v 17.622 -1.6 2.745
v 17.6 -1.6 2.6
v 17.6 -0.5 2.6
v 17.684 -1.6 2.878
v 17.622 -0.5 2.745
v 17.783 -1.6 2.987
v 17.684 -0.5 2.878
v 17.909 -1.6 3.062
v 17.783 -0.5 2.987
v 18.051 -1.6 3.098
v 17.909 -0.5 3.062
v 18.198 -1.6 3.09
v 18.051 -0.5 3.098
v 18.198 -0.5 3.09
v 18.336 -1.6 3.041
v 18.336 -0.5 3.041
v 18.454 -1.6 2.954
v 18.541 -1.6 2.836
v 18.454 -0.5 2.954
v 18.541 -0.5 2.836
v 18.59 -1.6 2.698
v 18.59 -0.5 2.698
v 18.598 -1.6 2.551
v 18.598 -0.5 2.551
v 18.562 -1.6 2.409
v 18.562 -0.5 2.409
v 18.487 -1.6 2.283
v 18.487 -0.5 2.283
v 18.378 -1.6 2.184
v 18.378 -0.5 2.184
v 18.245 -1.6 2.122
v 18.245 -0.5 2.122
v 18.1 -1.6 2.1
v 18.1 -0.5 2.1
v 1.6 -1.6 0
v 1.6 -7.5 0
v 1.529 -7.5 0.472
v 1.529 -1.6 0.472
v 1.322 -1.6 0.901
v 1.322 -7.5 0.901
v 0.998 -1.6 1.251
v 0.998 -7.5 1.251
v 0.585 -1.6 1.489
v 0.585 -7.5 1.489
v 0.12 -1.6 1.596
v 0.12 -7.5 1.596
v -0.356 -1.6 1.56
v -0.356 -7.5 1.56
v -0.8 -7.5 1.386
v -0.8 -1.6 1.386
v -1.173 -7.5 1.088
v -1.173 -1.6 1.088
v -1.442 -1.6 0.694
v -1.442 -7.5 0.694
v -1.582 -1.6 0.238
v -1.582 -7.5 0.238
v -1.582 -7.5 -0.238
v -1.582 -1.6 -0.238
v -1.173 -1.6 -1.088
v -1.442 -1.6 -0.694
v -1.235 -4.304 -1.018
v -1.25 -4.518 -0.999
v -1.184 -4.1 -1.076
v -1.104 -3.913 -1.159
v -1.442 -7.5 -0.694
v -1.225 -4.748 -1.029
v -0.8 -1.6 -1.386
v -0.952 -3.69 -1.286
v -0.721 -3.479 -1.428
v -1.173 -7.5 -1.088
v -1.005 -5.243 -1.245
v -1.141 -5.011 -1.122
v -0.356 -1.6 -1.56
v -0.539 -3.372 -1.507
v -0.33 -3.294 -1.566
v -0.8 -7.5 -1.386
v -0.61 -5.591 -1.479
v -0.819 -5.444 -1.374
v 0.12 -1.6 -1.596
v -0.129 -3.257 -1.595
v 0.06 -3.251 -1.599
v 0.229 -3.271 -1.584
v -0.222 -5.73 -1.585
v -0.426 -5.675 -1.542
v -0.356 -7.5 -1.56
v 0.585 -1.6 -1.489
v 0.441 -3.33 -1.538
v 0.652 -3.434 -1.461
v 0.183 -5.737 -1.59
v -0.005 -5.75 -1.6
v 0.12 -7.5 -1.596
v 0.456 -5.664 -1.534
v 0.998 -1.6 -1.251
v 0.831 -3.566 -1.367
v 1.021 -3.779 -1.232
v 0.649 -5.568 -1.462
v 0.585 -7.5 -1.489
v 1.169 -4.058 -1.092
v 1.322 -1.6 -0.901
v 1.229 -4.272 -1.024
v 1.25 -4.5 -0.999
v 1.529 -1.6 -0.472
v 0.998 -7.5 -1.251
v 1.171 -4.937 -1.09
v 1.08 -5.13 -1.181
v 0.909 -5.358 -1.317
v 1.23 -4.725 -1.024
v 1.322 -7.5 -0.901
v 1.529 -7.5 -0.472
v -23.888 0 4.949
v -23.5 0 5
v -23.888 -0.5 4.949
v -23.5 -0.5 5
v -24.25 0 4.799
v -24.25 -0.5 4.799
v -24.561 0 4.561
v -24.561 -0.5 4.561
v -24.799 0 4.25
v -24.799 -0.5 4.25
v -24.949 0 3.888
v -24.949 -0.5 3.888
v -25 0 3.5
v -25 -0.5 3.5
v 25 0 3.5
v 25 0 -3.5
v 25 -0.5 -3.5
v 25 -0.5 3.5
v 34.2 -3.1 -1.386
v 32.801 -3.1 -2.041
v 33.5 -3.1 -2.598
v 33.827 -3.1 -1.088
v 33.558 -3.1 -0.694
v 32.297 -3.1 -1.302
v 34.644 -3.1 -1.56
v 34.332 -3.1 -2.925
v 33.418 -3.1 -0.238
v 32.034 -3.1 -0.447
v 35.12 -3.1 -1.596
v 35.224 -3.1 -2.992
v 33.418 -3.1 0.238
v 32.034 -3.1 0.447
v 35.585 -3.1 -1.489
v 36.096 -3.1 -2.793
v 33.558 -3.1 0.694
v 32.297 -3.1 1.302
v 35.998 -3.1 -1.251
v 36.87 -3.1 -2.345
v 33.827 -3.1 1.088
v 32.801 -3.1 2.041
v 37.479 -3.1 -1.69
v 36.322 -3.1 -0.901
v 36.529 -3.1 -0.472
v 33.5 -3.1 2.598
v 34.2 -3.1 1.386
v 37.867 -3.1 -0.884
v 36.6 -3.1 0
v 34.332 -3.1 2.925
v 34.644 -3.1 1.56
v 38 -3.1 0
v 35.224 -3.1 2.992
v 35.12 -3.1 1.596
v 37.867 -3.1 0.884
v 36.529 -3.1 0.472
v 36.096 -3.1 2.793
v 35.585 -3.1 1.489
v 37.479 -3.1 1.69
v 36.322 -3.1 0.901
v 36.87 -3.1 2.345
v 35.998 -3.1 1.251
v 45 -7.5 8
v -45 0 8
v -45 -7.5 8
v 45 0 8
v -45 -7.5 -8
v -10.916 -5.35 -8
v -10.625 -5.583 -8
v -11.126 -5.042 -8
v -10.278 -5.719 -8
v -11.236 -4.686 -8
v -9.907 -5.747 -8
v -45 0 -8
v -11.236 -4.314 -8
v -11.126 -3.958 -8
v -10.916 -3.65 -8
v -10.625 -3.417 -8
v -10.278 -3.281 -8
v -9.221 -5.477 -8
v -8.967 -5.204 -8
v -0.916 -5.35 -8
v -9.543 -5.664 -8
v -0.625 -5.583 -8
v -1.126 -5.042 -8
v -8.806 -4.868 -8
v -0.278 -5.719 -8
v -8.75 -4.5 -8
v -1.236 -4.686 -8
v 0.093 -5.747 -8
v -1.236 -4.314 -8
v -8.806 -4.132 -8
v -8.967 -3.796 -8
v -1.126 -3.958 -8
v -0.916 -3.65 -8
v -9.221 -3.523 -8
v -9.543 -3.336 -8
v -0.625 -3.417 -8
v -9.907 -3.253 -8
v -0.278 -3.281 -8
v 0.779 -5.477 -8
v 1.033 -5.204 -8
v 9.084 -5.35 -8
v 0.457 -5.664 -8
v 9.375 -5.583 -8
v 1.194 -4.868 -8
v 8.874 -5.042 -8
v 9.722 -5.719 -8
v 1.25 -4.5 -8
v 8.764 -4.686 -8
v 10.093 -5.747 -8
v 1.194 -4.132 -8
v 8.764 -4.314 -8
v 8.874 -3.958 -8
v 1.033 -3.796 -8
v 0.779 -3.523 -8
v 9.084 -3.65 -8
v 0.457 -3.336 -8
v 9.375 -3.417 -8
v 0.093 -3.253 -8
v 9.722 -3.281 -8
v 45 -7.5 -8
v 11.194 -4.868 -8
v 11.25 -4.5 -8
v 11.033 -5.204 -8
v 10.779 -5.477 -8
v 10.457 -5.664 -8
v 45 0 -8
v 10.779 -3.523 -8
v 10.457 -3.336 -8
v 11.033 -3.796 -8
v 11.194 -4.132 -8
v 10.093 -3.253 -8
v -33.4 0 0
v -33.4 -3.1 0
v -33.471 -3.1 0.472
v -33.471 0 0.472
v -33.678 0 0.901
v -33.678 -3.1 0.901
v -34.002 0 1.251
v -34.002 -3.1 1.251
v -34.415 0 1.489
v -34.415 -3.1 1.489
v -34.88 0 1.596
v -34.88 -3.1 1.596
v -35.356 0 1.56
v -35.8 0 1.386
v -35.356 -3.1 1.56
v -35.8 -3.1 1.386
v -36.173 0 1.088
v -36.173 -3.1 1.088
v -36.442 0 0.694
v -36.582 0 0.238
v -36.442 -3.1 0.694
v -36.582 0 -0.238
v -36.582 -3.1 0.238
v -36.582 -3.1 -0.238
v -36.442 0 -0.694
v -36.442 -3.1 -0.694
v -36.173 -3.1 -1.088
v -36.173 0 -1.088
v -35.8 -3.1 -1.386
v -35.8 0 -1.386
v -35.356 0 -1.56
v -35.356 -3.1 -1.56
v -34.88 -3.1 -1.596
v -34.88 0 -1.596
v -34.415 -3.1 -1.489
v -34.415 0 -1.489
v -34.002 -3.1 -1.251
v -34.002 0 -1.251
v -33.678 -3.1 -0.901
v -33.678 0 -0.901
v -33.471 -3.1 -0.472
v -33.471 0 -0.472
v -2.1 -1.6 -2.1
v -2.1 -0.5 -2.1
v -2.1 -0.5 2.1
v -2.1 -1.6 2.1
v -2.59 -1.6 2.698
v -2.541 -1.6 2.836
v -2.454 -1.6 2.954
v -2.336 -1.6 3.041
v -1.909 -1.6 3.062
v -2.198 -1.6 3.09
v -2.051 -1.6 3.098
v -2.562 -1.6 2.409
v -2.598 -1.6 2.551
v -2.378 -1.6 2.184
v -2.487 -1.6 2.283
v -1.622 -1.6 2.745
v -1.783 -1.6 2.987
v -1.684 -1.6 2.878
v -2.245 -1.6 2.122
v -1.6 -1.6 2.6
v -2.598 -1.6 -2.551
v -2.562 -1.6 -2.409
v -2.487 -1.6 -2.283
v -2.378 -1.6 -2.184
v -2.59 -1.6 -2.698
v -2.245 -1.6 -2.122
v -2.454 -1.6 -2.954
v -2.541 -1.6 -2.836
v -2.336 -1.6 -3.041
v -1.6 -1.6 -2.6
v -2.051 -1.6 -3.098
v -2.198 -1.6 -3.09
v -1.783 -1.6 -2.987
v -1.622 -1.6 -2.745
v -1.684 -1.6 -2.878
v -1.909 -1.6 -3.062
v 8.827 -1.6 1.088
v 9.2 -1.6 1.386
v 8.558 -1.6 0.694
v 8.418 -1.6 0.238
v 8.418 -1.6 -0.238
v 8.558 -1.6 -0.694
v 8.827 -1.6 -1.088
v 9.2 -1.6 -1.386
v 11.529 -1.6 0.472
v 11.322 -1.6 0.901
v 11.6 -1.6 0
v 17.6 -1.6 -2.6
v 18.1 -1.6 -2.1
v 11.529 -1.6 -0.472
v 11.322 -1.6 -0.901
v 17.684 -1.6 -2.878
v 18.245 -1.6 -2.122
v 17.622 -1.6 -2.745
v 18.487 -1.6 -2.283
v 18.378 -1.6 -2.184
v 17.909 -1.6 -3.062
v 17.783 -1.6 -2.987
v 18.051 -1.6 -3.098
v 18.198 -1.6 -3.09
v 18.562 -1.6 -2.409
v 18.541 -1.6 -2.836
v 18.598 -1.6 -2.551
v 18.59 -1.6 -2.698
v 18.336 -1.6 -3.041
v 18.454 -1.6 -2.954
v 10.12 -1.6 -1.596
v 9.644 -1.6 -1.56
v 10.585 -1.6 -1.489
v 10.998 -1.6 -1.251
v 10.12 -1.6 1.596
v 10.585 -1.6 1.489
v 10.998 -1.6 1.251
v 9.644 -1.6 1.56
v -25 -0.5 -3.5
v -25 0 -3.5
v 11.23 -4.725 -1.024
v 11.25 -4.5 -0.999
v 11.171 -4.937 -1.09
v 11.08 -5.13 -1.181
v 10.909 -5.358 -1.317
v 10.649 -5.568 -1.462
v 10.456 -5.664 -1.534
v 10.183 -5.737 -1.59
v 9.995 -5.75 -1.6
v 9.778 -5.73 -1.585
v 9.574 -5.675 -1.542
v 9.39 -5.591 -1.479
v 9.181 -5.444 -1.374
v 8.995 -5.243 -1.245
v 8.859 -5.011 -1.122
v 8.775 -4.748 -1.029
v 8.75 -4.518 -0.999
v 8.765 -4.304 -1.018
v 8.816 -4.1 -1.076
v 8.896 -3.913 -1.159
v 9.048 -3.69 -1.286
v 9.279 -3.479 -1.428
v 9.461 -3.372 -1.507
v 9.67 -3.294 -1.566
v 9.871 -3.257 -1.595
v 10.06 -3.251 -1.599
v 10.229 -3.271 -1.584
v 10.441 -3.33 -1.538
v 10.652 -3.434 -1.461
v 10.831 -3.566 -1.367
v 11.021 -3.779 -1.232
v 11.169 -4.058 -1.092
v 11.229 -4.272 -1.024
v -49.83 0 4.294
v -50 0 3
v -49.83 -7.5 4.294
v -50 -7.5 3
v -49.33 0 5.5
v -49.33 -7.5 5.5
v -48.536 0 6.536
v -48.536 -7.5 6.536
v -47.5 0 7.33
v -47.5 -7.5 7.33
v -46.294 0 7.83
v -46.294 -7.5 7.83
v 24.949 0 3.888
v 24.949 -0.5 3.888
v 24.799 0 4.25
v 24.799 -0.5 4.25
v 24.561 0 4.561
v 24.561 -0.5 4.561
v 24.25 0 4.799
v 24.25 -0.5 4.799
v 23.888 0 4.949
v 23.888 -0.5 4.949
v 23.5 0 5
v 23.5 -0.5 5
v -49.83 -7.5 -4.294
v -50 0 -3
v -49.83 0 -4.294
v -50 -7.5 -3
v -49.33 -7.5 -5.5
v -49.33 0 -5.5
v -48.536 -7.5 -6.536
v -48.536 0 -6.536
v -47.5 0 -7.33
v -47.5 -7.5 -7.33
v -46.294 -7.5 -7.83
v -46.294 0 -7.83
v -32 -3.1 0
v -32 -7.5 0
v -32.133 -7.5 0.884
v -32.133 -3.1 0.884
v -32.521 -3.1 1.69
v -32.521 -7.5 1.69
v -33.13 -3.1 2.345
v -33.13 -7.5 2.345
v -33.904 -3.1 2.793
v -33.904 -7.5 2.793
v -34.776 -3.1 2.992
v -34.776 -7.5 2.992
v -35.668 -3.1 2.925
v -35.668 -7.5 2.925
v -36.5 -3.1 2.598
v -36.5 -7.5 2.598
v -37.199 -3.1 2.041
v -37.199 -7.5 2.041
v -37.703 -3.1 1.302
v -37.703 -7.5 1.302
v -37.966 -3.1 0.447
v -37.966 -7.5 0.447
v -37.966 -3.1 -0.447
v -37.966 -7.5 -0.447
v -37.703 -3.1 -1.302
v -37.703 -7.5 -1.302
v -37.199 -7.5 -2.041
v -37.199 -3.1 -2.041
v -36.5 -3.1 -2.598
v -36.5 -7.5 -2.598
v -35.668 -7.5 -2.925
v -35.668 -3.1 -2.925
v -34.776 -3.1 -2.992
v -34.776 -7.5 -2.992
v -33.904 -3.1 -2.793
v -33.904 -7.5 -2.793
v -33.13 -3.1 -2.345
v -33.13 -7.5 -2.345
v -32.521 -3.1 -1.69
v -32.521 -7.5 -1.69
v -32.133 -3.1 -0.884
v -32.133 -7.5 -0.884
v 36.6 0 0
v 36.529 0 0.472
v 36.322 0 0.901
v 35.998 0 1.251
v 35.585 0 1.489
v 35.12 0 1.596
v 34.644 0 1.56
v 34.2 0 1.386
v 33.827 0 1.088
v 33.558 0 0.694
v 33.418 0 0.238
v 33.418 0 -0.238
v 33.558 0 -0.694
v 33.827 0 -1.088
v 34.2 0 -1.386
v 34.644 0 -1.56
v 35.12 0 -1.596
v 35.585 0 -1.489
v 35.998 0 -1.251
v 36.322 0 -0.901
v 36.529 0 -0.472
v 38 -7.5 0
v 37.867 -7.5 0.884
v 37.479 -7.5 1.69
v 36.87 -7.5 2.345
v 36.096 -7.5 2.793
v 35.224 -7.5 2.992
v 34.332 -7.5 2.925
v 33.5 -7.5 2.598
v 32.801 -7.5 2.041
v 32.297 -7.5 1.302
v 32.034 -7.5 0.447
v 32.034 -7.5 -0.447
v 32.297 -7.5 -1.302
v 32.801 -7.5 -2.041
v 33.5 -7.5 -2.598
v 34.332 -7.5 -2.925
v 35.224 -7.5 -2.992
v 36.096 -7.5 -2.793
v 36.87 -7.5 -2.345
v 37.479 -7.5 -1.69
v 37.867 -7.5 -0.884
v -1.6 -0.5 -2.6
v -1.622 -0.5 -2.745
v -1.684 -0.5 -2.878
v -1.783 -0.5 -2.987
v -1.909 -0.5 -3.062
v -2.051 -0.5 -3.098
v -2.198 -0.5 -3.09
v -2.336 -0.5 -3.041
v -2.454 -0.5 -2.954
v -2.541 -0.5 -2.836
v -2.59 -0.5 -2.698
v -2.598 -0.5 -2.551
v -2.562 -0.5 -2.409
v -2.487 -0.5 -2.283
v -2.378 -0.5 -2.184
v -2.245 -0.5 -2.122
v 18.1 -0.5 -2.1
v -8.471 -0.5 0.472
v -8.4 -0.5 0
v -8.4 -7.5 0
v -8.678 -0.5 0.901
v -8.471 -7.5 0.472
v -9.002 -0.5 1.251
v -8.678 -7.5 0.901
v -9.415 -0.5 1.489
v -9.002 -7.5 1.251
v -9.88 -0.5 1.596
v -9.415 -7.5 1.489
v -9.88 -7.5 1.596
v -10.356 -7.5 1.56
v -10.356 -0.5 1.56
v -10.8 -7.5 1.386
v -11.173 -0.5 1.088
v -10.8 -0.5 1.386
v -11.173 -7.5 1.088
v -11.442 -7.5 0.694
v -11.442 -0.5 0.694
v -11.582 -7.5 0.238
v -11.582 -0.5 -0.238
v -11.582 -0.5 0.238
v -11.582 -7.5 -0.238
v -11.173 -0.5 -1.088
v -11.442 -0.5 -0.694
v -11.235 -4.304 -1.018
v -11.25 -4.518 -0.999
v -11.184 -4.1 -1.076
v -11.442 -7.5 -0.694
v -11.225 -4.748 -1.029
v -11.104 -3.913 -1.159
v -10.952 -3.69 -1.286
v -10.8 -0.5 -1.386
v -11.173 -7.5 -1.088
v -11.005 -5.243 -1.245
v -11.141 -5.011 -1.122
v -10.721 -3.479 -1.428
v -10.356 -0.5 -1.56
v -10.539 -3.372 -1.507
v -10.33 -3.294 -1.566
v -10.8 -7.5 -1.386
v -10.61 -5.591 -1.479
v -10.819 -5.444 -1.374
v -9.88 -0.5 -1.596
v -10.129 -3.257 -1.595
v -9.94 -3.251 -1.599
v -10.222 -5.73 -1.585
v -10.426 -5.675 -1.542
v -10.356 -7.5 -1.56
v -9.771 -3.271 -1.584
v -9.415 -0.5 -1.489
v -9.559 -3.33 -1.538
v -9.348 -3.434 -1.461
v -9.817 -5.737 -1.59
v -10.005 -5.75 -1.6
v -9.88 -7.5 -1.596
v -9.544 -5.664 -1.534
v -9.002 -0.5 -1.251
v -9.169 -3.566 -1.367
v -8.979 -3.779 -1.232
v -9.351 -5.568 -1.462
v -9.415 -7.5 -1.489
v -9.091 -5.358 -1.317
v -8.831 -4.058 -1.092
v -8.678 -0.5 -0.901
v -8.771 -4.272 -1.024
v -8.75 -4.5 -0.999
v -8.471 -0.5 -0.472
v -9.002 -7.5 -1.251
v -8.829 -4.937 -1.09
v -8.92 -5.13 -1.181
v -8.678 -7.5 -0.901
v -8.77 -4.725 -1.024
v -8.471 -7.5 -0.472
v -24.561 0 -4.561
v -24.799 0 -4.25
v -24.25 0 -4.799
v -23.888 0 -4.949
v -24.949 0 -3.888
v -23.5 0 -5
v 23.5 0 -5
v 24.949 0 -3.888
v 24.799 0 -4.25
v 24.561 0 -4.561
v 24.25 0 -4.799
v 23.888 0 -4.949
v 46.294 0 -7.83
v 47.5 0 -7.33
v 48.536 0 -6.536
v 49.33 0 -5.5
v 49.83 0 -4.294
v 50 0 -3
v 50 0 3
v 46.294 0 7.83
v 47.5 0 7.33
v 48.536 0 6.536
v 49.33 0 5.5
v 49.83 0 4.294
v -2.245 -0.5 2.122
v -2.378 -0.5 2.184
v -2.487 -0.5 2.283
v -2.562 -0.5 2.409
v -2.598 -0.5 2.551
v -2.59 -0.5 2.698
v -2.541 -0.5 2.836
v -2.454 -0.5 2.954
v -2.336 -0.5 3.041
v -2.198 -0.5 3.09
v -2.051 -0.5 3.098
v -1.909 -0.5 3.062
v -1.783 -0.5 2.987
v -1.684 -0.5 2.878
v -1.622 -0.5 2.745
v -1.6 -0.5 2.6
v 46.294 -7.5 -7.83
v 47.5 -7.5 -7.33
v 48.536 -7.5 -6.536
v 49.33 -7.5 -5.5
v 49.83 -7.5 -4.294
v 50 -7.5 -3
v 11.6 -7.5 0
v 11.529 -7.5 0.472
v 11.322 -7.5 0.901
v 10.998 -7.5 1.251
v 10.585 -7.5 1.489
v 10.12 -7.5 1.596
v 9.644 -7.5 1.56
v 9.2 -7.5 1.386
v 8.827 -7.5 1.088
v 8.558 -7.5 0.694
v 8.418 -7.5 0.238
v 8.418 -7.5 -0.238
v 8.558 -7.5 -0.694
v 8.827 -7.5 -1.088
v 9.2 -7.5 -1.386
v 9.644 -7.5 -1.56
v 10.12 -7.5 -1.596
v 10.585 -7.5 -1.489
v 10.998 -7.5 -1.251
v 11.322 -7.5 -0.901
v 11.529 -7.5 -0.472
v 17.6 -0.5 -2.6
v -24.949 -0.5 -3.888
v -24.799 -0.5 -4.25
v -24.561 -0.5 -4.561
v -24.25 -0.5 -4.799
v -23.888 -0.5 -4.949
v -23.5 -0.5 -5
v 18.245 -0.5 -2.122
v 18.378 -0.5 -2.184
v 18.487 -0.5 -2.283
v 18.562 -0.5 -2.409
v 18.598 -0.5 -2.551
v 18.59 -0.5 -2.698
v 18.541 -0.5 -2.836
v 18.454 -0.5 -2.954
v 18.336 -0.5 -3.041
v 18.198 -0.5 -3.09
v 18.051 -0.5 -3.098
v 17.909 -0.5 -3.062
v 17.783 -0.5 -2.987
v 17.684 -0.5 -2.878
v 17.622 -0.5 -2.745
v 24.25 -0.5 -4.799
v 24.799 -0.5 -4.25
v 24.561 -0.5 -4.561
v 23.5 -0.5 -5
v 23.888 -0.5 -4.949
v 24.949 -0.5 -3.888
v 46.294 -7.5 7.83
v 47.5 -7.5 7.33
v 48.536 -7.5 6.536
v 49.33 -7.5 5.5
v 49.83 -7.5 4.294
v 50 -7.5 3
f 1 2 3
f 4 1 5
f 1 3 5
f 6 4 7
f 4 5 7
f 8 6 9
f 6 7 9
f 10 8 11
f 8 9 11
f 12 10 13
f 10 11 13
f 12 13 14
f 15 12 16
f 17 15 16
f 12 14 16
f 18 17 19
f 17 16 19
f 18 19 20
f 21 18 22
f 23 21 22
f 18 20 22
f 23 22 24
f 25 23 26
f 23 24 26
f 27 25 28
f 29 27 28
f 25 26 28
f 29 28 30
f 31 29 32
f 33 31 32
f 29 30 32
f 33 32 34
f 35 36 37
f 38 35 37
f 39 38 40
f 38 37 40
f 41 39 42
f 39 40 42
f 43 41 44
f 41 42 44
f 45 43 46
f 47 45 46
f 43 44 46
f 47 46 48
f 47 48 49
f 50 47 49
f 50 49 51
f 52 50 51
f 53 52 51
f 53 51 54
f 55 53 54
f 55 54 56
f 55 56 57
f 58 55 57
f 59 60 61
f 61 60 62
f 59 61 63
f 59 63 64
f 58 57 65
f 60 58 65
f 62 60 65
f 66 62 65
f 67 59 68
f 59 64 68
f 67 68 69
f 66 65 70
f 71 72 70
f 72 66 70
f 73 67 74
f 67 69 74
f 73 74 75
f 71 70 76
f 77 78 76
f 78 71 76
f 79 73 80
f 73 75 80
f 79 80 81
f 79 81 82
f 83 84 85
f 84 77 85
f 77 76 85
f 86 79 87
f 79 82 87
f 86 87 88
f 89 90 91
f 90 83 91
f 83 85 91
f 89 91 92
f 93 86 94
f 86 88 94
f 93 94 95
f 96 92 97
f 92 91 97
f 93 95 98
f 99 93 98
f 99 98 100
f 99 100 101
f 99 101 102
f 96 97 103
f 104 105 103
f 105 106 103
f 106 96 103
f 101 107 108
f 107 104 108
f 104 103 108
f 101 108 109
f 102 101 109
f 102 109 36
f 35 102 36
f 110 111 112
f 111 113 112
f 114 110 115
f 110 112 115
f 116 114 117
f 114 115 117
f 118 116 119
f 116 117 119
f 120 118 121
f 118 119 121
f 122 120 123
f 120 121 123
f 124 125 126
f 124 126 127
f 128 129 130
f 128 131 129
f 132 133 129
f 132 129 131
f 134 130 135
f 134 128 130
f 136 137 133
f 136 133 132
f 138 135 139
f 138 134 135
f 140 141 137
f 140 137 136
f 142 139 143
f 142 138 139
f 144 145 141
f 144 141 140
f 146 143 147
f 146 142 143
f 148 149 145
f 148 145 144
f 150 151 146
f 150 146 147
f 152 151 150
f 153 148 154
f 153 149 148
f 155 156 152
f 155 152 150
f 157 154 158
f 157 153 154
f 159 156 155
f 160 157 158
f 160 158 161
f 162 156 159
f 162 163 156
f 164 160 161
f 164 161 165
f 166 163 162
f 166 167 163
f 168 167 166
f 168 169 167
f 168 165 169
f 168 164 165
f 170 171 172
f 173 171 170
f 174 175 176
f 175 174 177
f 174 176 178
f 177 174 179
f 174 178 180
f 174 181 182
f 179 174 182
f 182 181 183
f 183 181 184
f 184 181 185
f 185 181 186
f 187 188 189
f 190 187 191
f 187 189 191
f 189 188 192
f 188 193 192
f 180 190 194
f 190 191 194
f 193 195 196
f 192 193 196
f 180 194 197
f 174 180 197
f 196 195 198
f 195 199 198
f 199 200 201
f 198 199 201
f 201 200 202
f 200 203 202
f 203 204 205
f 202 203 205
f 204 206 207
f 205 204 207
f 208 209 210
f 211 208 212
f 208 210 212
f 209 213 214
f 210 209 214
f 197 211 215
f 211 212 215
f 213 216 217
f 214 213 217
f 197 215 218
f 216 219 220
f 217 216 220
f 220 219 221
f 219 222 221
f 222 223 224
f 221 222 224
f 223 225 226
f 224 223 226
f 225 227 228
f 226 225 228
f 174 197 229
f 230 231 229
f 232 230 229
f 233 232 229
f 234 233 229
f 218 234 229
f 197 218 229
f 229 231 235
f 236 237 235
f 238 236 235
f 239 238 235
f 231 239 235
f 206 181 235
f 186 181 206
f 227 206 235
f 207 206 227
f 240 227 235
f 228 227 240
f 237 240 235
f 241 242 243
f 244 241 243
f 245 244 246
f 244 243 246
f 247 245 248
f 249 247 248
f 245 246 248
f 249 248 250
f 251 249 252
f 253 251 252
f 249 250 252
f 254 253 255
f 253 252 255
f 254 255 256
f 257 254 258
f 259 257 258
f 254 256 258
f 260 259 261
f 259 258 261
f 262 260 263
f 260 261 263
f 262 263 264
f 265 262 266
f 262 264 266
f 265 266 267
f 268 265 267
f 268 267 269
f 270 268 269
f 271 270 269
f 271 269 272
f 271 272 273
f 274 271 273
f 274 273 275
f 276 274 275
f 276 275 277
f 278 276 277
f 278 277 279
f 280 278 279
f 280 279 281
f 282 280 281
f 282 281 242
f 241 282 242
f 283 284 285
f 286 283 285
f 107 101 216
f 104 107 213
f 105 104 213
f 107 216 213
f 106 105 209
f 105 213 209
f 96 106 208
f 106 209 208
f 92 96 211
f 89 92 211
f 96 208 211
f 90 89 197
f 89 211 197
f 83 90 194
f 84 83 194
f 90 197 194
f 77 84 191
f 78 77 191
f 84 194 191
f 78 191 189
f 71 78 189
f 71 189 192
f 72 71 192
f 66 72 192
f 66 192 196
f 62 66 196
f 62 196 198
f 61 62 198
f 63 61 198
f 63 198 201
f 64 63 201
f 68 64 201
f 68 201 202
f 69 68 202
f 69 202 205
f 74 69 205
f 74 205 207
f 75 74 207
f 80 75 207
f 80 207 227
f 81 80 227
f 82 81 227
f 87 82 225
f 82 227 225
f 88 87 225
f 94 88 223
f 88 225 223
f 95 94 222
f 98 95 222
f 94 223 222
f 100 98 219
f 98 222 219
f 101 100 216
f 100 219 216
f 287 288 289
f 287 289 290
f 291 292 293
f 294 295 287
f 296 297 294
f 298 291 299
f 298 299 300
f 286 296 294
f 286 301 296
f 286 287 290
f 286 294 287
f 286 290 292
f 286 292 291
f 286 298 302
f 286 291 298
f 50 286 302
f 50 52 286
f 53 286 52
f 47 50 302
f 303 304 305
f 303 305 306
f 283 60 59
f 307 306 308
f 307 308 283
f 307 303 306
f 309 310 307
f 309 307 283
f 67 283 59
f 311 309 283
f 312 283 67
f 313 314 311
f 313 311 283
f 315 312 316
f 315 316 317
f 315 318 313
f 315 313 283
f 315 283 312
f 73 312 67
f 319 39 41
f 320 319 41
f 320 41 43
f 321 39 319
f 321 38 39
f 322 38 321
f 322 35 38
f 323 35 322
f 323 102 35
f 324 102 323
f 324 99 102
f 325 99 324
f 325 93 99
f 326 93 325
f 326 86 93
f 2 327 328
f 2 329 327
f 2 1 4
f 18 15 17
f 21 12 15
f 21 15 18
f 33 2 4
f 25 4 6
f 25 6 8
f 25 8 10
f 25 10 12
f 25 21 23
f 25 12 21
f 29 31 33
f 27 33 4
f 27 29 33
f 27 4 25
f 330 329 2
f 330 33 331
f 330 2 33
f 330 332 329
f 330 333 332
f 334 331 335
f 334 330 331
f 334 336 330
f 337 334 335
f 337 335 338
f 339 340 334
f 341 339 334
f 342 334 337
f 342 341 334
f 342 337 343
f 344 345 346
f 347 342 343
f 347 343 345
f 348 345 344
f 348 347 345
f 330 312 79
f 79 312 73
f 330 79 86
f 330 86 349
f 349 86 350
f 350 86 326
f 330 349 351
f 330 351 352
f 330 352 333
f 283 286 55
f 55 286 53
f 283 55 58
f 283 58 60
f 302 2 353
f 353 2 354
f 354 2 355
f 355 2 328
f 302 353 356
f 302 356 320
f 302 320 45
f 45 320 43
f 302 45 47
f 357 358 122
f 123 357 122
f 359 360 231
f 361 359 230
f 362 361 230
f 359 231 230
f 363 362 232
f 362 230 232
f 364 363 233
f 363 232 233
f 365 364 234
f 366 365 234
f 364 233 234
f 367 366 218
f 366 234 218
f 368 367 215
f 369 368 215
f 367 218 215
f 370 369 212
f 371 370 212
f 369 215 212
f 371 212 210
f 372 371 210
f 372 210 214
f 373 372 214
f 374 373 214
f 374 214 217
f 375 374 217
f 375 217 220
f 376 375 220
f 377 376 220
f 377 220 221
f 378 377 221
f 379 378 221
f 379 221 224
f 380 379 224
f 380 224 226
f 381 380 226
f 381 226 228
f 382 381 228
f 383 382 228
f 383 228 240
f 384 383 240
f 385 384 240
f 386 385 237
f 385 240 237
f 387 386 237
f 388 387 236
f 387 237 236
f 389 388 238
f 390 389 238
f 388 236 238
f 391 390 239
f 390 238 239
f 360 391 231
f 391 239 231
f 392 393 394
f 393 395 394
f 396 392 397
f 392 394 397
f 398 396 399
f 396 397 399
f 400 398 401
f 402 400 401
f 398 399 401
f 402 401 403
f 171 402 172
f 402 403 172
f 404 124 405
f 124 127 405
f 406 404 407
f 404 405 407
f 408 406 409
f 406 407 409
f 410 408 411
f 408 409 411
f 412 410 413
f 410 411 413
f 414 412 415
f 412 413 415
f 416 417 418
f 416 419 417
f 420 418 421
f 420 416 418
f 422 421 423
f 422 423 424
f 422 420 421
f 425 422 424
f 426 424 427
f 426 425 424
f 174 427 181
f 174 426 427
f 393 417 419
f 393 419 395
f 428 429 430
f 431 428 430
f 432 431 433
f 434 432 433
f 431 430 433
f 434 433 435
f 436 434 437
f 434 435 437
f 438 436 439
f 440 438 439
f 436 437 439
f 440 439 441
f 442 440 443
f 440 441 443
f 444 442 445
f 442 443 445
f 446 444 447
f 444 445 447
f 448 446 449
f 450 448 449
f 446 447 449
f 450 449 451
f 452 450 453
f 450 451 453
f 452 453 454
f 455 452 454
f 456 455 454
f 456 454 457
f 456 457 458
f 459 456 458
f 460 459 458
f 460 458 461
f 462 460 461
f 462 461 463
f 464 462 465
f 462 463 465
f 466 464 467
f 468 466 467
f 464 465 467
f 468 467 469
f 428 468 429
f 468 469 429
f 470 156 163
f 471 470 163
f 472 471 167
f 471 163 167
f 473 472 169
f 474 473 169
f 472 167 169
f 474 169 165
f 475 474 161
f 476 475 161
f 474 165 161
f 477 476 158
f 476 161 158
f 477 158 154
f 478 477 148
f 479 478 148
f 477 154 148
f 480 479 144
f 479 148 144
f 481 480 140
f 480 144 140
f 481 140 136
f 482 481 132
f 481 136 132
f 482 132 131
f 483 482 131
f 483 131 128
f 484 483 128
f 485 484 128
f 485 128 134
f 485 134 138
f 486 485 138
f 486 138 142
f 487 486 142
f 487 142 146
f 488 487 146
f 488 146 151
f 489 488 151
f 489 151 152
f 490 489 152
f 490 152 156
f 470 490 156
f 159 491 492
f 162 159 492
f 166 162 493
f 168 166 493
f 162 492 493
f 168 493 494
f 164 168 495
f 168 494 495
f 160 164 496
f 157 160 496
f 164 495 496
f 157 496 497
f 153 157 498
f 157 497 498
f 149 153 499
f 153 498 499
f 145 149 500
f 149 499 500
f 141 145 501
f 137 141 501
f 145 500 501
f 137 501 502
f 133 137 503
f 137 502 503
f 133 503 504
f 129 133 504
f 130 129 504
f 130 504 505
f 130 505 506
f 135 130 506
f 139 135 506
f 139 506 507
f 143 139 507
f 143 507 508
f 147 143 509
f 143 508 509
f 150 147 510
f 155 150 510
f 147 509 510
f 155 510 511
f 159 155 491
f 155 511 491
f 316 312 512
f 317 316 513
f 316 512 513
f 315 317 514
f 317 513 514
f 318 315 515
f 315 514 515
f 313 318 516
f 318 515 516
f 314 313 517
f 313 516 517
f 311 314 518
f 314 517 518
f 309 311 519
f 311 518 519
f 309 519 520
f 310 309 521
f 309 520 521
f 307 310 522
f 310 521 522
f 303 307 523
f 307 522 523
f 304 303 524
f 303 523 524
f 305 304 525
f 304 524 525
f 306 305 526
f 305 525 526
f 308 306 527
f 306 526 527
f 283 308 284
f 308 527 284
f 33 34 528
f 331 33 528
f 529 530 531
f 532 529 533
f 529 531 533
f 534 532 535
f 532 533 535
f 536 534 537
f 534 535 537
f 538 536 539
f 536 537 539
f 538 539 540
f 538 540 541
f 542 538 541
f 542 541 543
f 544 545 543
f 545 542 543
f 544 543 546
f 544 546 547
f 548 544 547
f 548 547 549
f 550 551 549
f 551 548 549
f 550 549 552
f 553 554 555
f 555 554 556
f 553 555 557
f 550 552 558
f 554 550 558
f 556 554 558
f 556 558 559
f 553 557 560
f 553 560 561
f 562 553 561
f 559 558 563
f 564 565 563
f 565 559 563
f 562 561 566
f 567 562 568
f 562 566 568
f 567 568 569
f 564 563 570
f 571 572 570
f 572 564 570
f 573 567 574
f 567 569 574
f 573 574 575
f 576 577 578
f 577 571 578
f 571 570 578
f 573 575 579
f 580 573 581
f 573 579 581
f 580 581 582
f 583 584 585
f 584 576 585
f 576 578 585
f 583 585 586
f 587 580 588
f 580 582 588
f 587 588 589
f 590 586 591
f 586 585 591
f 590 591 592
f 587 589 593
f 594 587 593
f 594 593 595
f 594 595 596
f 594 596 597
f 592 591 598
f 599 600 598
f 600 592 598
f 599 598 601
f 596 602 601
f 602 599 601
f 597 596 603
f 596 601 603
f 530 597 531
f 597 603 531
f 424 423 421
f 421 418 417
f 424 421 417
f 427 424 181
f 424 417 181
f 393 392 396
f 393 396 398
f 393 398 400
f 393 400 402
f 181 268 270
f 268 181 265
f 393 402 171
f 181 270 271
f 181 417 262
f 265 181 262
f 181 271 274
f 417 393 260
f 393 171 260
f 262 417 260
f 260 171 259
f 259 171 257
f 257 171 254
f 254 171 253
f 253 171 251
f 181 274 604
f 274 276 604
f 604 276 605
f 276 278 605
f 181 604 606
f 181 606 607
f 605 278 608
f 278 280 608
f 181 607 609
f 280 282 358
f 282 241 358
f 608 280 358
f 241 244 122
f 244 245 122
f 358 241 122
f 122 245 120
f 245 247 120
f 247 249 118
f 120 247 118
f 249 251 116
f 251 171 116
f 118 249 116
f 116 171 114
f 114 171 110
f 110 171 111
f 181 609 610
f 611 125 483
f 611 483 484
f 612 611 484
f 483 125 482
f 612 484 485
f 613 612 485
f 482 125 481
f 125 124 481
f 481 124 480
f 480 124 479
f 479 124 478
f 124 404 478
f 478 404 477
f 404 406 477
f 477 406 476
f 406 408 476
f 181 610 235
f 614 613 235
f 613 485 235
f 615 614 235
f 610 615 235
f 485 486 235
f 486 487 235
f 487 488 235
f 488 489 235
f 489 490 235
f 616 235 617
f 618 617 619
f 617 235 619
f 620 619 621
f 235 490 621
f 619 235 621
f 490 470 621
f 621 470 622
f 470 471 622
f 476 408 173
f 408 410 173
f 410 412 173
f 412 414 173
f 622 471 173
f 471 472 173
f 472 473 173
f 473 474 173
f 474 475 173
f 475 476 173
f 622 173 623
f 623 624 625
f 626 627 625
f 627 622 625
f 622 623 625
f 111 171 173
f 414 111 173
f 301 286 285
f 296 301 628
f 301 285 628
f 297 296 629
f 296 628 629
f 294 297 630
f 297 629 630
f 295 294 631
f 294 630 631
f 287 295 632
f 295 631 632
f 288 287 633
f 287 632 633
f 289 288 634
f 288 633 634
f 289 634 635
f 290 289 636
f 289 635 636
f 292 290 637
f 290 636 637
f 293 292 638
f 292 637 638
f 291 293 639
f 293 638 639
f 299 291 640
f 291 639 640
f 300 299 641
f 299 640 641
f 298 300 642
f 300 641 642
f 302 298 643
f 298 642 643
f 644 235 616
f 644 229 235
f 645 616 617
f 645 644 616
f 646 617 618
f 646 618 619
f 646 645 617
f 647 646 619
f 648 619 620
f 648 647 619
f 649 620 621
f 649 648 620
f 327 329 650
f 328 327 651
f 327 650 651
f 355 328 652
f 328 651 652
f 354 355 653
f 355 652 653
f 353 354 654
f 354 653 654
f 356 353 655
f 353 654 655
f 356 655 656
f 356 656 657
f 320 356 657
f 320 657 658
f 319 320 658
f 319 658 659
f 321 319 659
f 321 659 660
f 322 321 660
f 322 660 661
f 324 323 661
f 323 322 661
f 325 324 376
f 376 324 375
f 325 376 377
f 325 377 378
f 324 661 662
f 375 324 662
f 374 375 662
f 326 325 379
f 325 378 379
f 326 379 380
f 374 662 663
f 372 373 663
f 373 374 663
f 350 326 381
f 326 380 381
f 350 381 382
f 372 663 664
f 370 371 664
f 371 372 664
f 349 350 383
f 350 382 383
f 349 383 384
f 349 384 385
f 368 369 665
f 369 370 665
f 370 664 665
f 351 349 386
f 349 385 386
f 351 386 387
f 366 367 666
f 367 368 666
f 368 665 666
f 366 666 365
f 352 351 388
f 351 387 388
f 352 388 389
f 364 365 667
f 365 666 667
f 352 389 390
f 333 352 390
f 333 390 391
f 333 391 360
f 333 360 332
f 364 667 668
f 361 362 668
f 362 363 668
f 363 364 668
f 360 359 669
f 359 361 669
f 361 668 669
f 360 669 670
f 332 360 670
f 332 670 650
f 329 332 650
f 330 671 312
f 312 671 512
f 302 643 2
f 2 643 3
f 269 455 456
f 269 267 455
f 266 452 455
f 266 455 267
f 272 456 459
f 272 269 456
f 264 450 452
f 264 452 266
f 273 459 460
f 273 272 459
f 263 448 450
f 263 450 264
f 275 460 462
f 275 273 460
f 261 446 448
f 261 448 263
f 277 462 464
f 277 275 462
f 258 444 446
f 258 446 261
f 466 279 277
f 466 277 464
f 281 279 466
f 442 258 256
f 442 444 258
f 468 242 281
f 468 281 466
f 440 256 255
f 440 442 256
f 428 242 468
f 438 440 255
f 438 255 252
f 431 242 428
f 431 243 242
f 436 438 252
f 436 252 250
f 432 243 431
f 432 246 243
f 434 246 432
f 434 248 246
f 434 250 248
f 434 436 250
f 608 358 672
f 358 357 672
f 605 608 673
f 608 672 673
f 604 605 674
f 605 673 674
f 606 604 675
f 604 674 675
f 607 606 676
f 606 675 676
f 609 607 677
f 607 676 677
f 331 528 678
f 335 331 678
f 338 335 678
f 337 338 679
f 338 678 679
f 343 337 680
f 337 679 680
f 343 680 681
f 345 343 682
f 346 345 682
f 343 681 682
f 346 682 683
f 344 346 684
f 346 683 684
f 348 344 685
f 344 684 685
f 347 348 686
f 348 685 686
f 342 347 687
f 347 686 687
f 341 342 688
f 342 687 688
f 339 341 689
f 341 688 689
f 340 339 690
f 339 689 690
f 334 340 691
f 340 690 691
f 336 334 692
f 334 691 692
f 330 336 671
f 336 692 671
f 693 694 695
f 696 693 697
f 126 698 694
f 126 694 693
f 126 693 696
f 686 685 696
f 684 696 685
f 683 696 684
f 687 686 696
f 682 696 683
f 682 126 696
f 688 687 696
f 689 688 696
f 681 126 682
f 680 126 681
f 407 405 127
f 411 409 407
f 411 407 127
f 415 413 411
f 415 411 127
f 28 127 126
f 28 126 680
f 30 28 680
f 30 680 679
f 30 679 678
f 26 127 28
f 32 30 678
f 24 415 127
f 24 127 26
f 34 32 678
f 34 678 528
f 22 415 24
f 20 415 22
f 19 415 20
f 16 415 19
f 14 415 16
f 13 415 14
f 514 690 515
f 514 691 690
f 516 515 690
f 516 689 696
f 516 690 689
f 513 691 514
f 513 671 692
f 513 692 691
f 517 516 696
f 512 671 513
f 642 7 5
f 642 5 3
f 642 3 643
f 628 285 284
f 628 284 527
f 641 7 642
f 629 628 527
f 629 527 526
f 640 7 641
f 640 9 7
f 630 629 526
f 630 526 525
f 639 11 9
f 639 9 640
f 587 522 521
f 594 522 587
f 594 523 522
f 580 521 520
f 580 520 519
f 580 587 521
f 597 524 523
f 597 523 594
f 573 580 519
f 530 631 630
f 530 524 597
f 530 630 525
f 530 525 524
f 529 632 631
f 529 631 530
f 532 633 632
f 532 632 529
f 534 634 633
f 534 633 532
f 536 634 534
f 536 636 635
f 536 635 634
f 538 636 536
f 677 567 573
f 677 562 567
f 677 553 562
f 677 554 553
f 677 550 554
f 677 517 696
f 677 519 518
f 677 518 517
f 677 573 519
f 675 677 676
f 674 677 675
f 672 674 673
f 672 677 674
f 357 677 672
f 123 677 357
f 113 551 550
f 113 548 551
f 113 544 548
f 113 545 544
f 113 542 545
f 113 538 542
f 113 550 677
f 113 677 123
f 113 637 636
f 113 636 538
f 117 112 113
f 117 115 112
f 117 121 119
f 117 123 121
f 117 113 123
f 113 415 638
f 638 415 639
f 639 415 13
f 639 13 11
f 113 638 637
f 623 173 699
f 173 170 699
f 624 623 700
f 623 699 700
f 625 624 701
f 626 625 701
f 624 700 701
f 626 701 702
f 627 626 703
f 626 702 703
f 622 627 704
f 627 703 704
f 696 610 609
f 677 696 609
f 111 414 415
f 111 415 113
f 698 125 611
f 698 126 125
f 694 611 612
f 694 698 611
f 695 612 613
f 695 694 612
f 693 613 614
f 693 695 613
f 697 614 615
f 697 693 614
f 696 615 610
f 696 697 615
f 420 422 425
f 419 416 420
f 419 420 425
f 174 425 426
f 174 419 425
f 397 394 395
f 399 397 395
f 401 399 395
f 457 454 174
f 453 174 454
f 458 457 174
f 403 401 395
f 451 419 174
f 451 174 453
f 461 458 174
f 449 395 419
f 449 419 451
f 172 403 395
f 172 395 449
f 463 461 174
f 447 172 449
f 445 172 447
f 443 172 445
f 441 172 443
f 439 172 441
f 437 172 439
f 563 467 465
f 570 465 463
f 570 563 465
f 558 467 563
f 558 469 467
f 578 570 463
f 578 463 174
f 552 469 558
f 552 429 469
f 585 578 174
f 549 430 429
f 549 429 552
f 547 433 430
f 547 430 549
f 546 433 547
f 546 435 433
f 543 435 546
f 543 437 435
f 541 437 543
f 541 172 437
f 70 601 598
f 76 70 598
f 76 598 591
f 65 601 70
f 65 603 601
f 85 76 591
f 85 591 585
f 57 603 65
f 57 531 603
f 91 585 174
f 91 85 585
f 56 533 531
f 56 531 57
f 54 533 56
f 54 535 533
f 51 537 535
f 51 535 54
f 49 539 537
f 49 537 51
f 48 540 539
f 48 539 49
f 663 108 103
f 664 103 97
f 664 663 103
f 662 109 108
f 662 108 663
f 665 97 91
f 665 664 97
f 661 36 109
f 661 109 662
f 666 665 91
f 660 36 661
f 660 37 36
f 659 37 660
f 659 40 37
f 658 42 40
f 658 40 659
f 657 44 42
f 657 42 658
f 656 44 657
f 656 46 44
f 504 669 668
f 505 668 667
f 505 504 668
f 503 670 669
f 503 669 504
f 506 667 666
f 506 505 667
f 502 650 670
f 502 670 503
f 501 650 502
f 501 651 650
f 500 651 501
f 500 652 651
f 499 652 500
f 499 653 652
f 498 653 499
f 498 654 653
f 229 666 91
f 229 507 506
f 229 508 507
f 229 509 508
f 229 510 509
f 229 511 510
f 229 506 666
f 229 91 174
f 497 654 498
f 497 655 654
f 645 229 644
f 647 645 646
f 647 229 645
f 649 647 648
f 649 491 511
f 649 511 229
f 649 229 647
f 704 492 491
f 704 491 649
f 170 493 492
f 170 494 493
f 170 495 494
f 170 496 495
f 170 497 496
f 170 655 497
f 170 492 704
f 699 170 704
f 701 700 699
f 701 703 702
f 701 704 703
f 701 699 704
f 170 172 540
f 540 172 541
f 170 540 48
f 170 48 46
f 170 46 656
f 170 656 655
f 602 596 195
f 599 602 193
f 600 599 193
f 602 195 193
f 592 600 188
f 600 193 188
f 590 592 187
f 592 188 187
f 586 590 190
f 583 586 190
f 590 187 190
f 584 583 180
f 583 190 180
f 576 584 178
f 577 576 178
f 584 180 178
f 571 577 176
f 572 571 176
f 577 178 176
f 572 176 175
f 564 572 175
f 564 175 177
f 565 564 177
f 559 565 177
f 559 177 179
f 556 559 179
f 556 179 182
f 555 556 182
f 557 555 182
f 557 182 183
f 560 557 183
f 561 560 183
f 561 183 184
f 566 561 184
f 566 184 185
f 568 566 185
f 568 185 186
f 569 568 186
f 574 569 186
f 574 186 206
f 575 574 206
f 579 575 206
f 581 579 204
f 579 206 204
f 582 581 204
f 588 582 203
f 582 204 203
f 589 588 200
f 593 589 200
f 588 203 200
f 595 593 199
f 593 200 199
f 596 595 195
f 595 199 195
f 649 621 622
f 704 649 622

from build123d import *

# Parameters (mm, degrees)
F0_W      = 100
F0_H      = 16
F1_DEPTH  = 7.5
F2_R      = 1.6
F3_DEPTH  = 7.501
F2_R_2    = 3
F4_DEPTH  = 4.4
F5_R      = 1.6
F6_DEPTH  = 7.501
F7_W      = 50
F7_H      = 10
F7_R      = 1.6
F8_DEPTH  = 0.5
F8_FACE_R = 1.6
F9_DEPTH  = 1.6
F10_R     = 1.5
F11_R     = 1.25
F12_DEPTH = 8
F13_R     = 5
F14_DEPTH = 8
F15_DEPTH = 7.501


with BuildPart() as f1:
    # F0 (on Front) → F1 (new body)
    with BuildSketch(Plane.XZ):
        Rectangle(F0_W, F0_H)
    extrude(amount=F1_DEPTH)

    # F2 (on face) → F3 (cut, through all)
    with BuildSketch(Plane.XZ.offset(7.5)):
        with Locations((35, 0)):
            Circle(F2_R)
        with Locations((-35, 0)):
            Circle(F2_R)
    extrude(amount=-F3_DEPTH, mode=Mode.SUBTRACT)

    # F2 (on face) → F4 (cut)
    with BuildSketch(Plane.XZ.offset(7.5)):
        with Locations((35, 0)):
            Circle(F2_R_2)
        with Locations((35, 0)):
            Circle(F2_R, mode=Mode.SUBTRACT)
        with Locations((-35, 0)):
            Circle(F2_R_2)
        with Locations((-35, 0)):
            Circle(F2_R, mode=Mode.SUBTRACT)
    extrude(amount=-F4_DEPTH, mode=Mode.SUBTRACT)

    # F5 (on face) → F6 (cut, through all)
    with BuildSketch(Plane.XZ.offset(7.5)):
        with Locations((10, 0)):
            Circle(F5_R)
        with Locations((-10, 0)):
            Circle(F5_R)
    extrude(amount=-F6_DEPTH, mode=Mode.SUBTRACT)

    # F7 (on face) → F8 (cut)
    with BuildSketch(Plane(origin=(0, 0, 0), x_dir=(-1, 0, 0), z_dir=(0, 1, 0))):
        Rectangle(F7_W, F7_H)
        with BuildLine():
            ThreePointArc((-18.1, 2.1), (-18.453553, 2.953553), (-17.6, 2.6))
            Line((-17.6, 2.6), (1.6, 2.6))
            ThreePointArc((1.6, 2.6), (2.453553, 2.953553), (2.1, 2.1))
            Line((2.1, 2.1), (2.1, -2.1))
            ThreePointArc((2.1, -2.1), (2.453553, -2.953553), (1.6, -2.6))
            Line((1.6, -2.6), (-17.6, -2.6))
            ThreePointArc((-17.6, -2.6), (-18.453553, -2.953553), (-18.1, -2.1))
            Line((-18.1, -2.1), (-18.1, 2.1))
        make_face(mode=Mode.SUBTRACT)
        with Locations((10, 0)):
            Circle(F7_R, mode=Mode.SUBTRACT)
    extrude(amount=-F8_DEPTH, mode=Mode.SUBTRACT)

    # F8_face (on face) → F9 (cut)
    with BuildSketch(Plane(origin=(7.838104, 0, 0), x_dir=(1, 0, 0), z_dir=(0, 1, 0))):
        with BuildLine():
            Line((9.761896, 2.6), (-9.438104, 2.6))
            ThreePointArc((-9.438104, 2.6), (-10.291658, 2.953553), (-9.938104, 2.1))
            Line((-9.938104, 2.1), (-9.938104, -2.1))
            ThreePointArc((-9.938104, -2.1), (-10.291658, -2.953553), (-9.438104, -2.6))
            Line((-9.438104, -2.6), (9.761896, -2.6))
            ThreePointArc((9.761896, -2.6), (10.615449, -2.953553), (10.261896, -2.1))
            Line((10.261896, -2.1), (10.261896, 2.1))
            ThreePointArc((10.261896, 2.1), (10.615449, 2.953553), (9.761896, 2.6))
        make_face()
        with Locations((2.161896, 0)):
            Circle(F8_FACE_R, mode=Mode.SUBTRACT)
    extrude(amount=-F9_DEPTH, mode=Mode.SUBTRACT)

    # F10
    f10_edges = [f1.edges().sort_by_distance(p)[0] for p in [
        (-25, -0.25, 5),
        (-25, -0.25, -5),
        (25, -0.25, -5),
        (25, -0.25, 5),
    ]]
    fillet(f10_edges, radius=F10_R)

    # F11 (on face) → F12 (cut)
    with BuildSketch(Plane(origin=(0, 0, -8), x_dir=(1, 0, 0), z_dir=(0, 0, -1))):
        with Locations((10, 4.5)):
            Circle(F11_R)
        with Locations((0, 4.5)):
            Circle(F11_R)
    extrude(amount=-F12_DEPTH, mode=Mode.SUBTRACT)

    # F13
    f13_edges = [f1.edges().sort_by_distance(p)[0] for p in [
        (-50, -3.75, 8),
        (-50, -3.75, -8),
        (50, -3.75, 8),
        (50, -3.75, -8),
    ]]
    fillet(f13_edges, radius=F13_R)

    # F11 (on face) → F14 (cut)
    with BuildSketch(Plane(origin=(0, 0, -8), x_dir=(1, 0, 0), z_dir=(0, 0, -1))):
        with Locations((10, 4.5)):
            Circle(F11_R)
        with Locations((0, 4.5)):
            Circle(F11_R)
        with Locations((-10, 4.5)):
            Circle(F11_R)
    extrude(amount=-F14_DEPTH, mode=Mode.SUBTRACT)

    # F5 (on face) → F15 (cut, through all)
    with BuildSketch(Plane.XZ.offset(7.5)):
        with Locations((10, 0)):
            Circle(F5_R)
        with Locations((-10, 0)):
            Circle(F5_R)
        Circle(F5_R)
    extrude(amount=-F15_DEPTH, mode=Mode.SUBTRACT)


solid = f1.part
